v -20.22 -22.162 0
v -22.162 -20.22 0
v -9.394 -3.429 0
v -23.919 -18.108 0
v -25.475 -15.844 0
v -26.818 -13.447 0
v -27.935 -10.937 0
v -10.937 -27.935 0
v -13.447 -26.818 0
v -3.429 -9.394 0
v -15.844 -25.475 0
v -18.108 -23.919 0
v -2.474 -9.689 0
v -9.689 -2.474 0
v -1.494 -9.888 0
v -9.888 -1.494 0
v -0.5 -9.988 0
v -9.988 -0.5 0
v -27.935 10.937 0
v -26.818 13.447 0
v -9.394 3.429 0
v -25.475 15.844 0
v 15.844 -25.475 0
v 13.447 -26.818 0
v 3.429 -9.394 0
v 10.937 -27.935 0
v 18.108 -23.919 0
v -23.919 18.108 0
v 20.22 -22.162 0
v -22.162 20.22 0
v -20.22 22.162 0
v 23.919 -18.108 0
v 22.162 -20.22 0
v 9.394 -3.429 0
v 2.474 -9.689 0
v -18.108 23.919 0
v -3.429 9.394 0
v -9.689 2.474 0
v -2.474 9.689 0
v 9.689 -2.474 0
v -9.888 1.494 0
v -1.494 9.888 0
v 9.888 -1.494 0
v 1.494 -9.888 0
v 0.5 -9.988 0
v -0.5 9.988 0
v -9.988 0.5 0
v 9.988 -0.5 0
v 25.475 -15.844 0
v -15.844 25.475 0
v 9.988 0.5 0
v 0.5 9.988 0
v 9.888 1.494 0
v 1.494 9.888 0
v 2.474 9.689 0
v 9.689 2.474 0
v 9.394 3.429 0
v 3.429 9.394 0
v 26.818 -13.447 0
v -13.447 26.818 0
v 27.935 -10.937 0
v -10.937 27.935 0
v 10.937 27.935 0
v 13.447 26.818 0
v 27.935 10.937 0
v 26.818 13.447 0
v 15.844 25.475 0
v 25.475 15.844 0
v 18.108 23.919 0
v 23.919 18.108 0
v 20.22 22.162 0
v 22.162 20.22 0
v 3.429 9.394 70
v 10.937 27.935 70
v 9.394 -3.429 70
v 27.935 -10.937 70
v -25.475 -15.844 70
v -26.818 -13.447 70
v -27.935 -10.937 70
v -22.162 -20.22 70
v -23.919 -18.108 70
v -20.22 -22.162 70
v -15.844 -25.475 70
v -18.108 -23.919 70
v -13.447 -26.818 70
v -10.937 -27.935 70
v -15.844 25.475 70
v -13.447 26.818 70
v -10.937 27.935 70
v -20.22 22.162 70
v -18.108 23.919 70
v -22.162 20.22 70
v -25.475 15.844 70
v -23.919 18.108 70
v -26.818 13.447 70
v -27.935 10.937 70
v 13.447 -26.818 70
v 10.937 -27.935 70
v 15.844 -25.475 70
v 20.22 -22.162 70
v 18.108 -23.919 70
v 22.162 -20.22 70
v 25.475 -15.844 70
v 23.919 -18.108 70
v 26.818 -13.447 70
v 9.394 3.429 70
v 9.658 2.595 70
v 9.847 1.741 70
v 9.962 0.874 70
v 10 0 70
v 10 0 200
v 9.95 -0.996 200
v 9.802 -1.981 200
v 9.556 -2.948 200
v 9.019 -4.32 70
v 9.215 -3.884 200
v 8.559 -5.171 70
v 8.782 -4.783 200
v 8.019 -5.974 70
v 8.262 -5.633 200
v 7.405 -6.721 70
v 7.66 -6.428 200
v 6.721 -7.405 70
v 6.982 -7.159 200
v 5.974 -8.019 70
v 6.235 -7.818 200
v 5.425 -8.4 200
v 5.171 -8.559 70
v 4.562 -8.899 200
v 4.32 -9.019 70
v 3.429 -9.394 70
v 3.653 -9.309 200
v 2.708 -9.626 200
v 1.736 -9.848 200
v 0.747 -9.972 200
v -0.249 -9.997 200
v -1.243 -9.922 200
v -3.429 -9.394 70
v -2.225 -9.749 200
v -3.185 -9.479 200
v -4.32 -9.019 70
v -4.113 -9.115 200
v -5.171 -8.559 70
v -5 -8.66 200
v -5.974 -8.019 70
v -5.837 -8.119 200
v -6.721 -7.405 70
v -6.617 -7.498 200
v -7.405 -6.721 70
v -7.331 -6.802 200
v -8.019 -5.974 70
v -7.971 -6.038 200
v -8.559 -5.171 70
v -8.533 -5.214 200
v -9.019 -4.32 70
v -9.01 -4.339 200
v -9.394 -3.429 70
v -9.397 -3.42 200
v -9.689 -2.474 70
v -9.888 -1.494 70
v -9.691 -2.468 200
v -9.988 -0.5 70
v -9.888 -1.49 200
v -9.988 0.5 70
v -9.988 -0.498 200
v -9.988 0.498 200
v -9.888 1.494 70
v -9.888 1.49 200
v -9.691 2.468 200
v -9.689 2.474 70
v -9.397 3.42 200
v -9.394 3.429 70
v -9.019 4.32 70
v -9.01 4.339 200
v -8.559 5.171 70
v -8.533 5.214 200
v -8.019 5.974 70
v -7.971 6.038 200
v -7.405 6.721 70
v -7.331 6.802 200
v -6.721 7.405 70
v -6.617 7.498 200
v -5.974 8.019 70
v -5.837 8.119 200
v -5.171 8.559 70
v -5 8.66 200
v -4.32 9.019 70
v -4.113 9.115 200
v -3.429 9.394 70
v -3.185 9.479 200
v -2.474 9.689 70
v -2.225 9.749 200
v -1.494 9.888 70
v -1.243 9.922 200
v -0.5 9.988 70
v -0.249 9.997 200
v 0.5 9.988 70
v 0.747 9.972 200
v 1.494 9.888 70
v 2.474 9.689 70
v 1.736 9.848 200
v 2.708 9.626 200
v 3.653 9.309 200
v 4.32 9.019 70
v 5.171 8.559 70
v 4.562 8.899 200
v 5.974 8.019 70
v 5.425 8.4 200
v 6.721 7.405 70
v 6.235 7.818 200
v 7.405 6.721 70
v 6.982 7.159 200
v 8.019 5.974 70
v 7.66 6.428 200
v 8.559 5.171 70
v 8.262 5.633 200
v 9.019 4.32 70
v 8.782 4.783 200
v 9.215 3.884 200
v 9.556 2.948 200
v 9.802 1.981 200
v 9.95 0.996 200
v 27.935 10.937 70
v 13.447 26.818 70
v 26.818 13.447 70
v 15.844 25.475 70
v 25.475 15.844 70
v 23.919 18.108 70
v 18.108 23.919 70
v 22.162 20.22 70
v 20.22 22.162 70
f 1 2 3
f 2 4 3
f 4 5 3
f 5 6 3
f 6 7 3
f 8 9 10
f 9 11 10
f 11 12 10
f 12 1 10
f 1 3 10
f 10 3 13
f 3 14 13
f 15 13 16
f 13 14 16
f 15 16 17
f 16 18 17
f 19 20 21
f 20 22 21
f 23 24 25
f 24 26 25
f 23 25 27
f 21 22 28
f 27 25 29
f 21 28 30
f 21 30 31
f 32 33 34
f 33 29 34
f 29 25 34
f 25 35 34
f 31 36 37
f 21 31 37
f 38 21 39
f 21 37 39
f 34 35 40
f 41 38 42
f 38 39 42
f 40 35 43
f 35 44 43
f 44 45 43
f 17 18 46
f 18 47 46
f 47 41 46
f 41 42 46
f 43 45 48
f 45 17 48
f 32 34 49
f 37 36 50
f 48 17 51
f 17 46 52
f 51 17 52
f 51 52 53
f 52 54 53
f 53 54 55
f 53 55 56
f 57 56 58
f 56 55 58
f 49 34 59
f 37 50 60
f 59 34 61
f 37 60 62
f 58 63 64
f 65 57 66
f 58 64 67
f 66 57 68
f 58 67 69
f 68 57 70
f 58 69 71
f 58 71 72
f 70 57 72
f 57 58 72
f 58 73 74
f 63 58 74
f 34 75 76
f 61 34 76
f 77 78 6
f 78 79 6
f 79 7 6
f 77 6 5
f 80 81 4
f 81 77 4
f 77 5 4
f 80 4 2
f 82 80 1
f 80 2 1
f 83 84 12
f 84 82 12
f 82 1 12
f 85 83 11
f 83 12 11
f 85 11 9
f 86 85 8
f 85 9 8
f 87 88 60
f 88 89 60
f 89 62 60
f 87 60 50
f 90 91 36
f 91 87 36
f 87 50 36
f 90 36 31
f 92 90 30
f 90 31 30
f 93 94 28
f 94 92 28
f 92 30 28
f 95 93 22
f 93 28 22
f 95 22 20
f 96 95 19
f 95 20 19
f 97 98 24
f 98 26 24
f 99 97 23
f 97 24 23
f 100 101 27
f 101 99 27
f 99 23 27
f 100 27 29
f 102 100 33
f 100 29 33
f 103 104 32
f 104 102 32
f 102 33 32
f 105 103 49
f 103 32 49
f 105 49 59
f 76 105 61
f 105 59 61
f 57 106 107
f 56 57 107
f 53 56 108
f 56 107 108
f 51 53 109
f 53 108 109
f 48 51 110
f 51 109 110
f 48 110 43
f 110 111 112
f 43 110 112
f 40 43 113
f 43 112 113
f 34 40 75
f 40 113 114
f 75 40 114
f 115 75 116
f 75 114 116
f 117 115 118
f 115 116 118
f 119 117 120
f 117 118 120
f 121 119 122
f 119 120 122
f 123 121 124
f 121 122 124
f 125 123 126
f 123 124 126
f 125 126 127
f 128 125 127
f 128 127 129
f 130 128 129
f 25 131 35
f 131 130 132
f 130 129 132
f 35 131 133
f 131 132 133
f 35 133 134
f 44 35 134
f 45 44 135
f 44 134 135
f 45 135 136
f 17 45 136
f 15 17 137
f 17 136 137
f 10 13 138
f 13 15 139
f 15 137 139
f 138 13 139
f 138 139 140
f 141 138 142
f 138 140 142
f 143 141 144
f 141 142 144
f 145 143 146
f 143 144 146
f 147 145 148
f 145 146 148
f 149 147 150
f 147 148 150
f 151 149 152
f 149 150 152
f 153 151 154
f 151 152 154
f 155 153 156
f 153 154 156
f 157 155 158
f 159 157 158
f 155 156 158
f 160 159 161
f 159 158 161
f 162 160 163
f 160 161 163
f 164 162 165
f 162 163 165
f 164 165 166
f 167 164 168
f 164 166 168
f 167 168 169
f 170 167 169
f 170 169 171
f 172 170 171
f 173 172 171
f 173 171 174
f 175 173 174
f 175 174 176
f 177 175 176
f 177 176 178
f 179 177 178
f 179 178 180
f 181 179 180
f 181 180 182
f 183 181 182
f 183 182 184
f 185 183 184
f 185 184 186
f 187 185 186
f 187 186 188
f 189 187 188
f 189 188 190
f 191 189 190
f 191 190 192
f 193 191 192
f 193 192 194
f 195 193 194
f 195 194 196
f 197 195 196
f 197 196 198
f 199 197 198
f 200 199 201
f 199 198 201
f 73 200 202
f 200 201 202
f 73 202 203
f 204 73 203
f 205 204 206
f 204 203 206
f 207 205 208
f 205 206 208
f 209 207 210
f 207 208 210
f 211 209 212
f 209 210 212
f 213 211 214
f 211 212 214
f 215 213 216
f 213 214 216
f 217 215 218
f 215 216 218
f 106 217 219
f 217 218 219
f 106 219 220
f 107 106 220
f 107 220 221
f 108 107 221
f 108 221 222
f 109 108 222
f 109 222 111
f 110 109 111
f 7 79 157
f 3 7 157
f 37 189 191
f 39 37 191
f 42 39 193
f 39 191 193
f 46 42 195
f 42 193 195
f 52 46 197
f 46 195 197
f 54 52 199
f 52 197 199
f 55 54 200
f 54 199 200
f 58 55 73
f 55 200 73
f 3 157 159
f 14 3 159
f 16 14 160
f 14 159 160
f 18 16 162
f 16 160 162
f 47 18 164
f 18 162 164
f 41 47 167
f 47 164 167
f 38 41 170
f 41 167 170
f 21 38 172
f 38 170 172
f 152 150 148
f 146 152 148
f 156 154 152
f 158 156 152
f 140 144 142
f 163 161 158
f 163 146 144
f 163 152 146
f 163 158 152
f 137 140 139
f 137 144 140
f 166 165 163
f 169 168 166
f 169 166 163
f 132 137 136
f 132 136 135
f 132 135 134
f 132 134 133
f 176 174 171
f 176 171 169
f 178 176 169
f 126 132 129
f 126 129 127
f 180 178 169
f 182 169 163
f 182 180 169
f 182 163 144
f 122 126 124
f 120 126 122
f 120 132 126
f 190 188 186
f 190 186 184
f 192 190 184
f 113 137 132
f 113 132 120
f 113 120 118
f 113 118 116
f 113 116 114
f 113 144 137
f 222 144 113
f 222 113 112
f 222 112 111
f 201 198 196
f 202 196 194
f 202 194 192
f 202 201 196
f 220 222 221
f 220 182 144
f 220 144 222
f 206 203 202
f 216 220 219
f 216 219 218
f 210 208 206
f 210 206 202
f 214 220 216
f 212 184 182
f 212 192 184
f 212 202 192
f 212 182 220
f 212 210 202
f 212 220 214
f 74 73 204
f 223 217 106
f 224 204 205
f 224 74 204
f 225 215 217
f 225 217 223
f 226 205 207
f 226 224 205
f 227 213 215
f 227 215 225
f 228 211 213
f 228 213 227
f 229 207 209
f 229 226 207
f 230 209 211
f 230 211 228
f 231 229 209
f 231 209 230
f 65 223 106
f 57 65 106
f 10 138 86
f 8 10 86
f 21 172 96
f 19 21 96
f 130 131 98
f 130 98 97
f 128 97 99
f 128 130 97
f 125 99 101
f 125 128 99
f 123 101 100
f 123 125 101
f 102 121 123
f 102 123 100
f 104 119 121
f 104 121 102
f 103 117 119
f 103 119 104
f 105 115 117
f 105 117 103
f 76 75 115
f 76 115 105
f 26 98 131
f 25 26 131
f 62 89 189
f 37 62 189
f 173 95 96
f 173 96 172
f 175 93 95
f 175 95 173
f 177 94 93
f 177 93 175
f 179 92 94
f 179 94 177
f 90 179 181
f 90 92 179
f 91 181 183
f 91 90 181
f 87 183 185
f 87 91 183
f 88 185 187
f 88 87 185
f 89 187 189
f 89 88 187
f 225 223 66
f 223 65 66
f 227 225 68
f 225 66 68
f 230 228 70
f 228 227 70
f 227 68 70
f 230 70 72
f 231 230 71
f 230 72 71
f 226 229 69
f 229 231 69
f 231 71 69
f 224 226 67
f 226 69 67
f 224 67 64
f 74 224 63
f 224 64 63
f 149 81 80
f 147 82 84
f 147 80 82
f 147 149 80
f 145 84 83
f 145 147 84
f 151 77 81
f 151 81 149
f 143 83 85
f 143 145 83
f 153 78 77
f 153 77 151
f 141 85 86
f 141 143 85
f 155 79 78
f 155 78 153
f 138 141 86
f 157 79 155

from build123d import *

# Parameters (mm, degrees)
F0_R            = 30
F0_R_2          = 10
F1_DEPTH        = 70
F2_R            = 10
F3_DEPTH        = 130
F3_DEPTH_BACK   = 70
F5_DEPTH        = 70
F5_COPIES_COUNT = 4


# Not quite as in the source:
# - a pattern or mirror of a feature is missing from the dataset's text; its kind, count and spacing are read off the source's solid


with BuildPart() as f1:
    # F0 (on Top) → F1 (new body)
    with BuildSketch(Plane.XY):
        Circle(F0_R)
        Circle(F0_R_2, mode=Mode.SUBTRACT)
    extrude(amount=F1_DEPTH)

    # F2 (on face) → F3 (join, two sides)
    with BuildSketch(Plane.XY.offset(70)) as f3_sk:
        Circle(F2_R)
    extrude(amount=F3_DEPTH)
    extrude(f3_sk.sketch, amount=-F3_DEPTH_BACK)

    # F4 (on face) → F5 (cut, through all)
    with BuildSketch(Plane.XY.offset(70)):
        with BuildLine():
            ThreePointArc((3.4286095737, -9.3938616336), (0, -10), (-3.4286095737, -9.3938616336))
            Line((-3.4286095737, -9.3938616336), (-10.9373596855, -27.9351778786))
            ThreePointArc((-10.9373596855, -27.9351778786), (0, -30), (10.9373596855, -27.9351778786))
            Line((10.9373596855, -27.9351778786), (3.4286095737, -9.3938616336))
        make_face()
    f5 = extrude(amount=-F5_DEPTH, mode=Mode.SUBTRACT)

    # F5_copies: F5 ×4 about axis
    f5_copies_axis = Axis((0, 0, 0), (0, 0, 1))
    for i in range(1, F5_COPIES_COUNT):
        add(f5.rotate(f5_copies_axis, i * 360 / F5_COPIES_COUNT), mode=Mode.SUBTRACT)


solid = f1.part
